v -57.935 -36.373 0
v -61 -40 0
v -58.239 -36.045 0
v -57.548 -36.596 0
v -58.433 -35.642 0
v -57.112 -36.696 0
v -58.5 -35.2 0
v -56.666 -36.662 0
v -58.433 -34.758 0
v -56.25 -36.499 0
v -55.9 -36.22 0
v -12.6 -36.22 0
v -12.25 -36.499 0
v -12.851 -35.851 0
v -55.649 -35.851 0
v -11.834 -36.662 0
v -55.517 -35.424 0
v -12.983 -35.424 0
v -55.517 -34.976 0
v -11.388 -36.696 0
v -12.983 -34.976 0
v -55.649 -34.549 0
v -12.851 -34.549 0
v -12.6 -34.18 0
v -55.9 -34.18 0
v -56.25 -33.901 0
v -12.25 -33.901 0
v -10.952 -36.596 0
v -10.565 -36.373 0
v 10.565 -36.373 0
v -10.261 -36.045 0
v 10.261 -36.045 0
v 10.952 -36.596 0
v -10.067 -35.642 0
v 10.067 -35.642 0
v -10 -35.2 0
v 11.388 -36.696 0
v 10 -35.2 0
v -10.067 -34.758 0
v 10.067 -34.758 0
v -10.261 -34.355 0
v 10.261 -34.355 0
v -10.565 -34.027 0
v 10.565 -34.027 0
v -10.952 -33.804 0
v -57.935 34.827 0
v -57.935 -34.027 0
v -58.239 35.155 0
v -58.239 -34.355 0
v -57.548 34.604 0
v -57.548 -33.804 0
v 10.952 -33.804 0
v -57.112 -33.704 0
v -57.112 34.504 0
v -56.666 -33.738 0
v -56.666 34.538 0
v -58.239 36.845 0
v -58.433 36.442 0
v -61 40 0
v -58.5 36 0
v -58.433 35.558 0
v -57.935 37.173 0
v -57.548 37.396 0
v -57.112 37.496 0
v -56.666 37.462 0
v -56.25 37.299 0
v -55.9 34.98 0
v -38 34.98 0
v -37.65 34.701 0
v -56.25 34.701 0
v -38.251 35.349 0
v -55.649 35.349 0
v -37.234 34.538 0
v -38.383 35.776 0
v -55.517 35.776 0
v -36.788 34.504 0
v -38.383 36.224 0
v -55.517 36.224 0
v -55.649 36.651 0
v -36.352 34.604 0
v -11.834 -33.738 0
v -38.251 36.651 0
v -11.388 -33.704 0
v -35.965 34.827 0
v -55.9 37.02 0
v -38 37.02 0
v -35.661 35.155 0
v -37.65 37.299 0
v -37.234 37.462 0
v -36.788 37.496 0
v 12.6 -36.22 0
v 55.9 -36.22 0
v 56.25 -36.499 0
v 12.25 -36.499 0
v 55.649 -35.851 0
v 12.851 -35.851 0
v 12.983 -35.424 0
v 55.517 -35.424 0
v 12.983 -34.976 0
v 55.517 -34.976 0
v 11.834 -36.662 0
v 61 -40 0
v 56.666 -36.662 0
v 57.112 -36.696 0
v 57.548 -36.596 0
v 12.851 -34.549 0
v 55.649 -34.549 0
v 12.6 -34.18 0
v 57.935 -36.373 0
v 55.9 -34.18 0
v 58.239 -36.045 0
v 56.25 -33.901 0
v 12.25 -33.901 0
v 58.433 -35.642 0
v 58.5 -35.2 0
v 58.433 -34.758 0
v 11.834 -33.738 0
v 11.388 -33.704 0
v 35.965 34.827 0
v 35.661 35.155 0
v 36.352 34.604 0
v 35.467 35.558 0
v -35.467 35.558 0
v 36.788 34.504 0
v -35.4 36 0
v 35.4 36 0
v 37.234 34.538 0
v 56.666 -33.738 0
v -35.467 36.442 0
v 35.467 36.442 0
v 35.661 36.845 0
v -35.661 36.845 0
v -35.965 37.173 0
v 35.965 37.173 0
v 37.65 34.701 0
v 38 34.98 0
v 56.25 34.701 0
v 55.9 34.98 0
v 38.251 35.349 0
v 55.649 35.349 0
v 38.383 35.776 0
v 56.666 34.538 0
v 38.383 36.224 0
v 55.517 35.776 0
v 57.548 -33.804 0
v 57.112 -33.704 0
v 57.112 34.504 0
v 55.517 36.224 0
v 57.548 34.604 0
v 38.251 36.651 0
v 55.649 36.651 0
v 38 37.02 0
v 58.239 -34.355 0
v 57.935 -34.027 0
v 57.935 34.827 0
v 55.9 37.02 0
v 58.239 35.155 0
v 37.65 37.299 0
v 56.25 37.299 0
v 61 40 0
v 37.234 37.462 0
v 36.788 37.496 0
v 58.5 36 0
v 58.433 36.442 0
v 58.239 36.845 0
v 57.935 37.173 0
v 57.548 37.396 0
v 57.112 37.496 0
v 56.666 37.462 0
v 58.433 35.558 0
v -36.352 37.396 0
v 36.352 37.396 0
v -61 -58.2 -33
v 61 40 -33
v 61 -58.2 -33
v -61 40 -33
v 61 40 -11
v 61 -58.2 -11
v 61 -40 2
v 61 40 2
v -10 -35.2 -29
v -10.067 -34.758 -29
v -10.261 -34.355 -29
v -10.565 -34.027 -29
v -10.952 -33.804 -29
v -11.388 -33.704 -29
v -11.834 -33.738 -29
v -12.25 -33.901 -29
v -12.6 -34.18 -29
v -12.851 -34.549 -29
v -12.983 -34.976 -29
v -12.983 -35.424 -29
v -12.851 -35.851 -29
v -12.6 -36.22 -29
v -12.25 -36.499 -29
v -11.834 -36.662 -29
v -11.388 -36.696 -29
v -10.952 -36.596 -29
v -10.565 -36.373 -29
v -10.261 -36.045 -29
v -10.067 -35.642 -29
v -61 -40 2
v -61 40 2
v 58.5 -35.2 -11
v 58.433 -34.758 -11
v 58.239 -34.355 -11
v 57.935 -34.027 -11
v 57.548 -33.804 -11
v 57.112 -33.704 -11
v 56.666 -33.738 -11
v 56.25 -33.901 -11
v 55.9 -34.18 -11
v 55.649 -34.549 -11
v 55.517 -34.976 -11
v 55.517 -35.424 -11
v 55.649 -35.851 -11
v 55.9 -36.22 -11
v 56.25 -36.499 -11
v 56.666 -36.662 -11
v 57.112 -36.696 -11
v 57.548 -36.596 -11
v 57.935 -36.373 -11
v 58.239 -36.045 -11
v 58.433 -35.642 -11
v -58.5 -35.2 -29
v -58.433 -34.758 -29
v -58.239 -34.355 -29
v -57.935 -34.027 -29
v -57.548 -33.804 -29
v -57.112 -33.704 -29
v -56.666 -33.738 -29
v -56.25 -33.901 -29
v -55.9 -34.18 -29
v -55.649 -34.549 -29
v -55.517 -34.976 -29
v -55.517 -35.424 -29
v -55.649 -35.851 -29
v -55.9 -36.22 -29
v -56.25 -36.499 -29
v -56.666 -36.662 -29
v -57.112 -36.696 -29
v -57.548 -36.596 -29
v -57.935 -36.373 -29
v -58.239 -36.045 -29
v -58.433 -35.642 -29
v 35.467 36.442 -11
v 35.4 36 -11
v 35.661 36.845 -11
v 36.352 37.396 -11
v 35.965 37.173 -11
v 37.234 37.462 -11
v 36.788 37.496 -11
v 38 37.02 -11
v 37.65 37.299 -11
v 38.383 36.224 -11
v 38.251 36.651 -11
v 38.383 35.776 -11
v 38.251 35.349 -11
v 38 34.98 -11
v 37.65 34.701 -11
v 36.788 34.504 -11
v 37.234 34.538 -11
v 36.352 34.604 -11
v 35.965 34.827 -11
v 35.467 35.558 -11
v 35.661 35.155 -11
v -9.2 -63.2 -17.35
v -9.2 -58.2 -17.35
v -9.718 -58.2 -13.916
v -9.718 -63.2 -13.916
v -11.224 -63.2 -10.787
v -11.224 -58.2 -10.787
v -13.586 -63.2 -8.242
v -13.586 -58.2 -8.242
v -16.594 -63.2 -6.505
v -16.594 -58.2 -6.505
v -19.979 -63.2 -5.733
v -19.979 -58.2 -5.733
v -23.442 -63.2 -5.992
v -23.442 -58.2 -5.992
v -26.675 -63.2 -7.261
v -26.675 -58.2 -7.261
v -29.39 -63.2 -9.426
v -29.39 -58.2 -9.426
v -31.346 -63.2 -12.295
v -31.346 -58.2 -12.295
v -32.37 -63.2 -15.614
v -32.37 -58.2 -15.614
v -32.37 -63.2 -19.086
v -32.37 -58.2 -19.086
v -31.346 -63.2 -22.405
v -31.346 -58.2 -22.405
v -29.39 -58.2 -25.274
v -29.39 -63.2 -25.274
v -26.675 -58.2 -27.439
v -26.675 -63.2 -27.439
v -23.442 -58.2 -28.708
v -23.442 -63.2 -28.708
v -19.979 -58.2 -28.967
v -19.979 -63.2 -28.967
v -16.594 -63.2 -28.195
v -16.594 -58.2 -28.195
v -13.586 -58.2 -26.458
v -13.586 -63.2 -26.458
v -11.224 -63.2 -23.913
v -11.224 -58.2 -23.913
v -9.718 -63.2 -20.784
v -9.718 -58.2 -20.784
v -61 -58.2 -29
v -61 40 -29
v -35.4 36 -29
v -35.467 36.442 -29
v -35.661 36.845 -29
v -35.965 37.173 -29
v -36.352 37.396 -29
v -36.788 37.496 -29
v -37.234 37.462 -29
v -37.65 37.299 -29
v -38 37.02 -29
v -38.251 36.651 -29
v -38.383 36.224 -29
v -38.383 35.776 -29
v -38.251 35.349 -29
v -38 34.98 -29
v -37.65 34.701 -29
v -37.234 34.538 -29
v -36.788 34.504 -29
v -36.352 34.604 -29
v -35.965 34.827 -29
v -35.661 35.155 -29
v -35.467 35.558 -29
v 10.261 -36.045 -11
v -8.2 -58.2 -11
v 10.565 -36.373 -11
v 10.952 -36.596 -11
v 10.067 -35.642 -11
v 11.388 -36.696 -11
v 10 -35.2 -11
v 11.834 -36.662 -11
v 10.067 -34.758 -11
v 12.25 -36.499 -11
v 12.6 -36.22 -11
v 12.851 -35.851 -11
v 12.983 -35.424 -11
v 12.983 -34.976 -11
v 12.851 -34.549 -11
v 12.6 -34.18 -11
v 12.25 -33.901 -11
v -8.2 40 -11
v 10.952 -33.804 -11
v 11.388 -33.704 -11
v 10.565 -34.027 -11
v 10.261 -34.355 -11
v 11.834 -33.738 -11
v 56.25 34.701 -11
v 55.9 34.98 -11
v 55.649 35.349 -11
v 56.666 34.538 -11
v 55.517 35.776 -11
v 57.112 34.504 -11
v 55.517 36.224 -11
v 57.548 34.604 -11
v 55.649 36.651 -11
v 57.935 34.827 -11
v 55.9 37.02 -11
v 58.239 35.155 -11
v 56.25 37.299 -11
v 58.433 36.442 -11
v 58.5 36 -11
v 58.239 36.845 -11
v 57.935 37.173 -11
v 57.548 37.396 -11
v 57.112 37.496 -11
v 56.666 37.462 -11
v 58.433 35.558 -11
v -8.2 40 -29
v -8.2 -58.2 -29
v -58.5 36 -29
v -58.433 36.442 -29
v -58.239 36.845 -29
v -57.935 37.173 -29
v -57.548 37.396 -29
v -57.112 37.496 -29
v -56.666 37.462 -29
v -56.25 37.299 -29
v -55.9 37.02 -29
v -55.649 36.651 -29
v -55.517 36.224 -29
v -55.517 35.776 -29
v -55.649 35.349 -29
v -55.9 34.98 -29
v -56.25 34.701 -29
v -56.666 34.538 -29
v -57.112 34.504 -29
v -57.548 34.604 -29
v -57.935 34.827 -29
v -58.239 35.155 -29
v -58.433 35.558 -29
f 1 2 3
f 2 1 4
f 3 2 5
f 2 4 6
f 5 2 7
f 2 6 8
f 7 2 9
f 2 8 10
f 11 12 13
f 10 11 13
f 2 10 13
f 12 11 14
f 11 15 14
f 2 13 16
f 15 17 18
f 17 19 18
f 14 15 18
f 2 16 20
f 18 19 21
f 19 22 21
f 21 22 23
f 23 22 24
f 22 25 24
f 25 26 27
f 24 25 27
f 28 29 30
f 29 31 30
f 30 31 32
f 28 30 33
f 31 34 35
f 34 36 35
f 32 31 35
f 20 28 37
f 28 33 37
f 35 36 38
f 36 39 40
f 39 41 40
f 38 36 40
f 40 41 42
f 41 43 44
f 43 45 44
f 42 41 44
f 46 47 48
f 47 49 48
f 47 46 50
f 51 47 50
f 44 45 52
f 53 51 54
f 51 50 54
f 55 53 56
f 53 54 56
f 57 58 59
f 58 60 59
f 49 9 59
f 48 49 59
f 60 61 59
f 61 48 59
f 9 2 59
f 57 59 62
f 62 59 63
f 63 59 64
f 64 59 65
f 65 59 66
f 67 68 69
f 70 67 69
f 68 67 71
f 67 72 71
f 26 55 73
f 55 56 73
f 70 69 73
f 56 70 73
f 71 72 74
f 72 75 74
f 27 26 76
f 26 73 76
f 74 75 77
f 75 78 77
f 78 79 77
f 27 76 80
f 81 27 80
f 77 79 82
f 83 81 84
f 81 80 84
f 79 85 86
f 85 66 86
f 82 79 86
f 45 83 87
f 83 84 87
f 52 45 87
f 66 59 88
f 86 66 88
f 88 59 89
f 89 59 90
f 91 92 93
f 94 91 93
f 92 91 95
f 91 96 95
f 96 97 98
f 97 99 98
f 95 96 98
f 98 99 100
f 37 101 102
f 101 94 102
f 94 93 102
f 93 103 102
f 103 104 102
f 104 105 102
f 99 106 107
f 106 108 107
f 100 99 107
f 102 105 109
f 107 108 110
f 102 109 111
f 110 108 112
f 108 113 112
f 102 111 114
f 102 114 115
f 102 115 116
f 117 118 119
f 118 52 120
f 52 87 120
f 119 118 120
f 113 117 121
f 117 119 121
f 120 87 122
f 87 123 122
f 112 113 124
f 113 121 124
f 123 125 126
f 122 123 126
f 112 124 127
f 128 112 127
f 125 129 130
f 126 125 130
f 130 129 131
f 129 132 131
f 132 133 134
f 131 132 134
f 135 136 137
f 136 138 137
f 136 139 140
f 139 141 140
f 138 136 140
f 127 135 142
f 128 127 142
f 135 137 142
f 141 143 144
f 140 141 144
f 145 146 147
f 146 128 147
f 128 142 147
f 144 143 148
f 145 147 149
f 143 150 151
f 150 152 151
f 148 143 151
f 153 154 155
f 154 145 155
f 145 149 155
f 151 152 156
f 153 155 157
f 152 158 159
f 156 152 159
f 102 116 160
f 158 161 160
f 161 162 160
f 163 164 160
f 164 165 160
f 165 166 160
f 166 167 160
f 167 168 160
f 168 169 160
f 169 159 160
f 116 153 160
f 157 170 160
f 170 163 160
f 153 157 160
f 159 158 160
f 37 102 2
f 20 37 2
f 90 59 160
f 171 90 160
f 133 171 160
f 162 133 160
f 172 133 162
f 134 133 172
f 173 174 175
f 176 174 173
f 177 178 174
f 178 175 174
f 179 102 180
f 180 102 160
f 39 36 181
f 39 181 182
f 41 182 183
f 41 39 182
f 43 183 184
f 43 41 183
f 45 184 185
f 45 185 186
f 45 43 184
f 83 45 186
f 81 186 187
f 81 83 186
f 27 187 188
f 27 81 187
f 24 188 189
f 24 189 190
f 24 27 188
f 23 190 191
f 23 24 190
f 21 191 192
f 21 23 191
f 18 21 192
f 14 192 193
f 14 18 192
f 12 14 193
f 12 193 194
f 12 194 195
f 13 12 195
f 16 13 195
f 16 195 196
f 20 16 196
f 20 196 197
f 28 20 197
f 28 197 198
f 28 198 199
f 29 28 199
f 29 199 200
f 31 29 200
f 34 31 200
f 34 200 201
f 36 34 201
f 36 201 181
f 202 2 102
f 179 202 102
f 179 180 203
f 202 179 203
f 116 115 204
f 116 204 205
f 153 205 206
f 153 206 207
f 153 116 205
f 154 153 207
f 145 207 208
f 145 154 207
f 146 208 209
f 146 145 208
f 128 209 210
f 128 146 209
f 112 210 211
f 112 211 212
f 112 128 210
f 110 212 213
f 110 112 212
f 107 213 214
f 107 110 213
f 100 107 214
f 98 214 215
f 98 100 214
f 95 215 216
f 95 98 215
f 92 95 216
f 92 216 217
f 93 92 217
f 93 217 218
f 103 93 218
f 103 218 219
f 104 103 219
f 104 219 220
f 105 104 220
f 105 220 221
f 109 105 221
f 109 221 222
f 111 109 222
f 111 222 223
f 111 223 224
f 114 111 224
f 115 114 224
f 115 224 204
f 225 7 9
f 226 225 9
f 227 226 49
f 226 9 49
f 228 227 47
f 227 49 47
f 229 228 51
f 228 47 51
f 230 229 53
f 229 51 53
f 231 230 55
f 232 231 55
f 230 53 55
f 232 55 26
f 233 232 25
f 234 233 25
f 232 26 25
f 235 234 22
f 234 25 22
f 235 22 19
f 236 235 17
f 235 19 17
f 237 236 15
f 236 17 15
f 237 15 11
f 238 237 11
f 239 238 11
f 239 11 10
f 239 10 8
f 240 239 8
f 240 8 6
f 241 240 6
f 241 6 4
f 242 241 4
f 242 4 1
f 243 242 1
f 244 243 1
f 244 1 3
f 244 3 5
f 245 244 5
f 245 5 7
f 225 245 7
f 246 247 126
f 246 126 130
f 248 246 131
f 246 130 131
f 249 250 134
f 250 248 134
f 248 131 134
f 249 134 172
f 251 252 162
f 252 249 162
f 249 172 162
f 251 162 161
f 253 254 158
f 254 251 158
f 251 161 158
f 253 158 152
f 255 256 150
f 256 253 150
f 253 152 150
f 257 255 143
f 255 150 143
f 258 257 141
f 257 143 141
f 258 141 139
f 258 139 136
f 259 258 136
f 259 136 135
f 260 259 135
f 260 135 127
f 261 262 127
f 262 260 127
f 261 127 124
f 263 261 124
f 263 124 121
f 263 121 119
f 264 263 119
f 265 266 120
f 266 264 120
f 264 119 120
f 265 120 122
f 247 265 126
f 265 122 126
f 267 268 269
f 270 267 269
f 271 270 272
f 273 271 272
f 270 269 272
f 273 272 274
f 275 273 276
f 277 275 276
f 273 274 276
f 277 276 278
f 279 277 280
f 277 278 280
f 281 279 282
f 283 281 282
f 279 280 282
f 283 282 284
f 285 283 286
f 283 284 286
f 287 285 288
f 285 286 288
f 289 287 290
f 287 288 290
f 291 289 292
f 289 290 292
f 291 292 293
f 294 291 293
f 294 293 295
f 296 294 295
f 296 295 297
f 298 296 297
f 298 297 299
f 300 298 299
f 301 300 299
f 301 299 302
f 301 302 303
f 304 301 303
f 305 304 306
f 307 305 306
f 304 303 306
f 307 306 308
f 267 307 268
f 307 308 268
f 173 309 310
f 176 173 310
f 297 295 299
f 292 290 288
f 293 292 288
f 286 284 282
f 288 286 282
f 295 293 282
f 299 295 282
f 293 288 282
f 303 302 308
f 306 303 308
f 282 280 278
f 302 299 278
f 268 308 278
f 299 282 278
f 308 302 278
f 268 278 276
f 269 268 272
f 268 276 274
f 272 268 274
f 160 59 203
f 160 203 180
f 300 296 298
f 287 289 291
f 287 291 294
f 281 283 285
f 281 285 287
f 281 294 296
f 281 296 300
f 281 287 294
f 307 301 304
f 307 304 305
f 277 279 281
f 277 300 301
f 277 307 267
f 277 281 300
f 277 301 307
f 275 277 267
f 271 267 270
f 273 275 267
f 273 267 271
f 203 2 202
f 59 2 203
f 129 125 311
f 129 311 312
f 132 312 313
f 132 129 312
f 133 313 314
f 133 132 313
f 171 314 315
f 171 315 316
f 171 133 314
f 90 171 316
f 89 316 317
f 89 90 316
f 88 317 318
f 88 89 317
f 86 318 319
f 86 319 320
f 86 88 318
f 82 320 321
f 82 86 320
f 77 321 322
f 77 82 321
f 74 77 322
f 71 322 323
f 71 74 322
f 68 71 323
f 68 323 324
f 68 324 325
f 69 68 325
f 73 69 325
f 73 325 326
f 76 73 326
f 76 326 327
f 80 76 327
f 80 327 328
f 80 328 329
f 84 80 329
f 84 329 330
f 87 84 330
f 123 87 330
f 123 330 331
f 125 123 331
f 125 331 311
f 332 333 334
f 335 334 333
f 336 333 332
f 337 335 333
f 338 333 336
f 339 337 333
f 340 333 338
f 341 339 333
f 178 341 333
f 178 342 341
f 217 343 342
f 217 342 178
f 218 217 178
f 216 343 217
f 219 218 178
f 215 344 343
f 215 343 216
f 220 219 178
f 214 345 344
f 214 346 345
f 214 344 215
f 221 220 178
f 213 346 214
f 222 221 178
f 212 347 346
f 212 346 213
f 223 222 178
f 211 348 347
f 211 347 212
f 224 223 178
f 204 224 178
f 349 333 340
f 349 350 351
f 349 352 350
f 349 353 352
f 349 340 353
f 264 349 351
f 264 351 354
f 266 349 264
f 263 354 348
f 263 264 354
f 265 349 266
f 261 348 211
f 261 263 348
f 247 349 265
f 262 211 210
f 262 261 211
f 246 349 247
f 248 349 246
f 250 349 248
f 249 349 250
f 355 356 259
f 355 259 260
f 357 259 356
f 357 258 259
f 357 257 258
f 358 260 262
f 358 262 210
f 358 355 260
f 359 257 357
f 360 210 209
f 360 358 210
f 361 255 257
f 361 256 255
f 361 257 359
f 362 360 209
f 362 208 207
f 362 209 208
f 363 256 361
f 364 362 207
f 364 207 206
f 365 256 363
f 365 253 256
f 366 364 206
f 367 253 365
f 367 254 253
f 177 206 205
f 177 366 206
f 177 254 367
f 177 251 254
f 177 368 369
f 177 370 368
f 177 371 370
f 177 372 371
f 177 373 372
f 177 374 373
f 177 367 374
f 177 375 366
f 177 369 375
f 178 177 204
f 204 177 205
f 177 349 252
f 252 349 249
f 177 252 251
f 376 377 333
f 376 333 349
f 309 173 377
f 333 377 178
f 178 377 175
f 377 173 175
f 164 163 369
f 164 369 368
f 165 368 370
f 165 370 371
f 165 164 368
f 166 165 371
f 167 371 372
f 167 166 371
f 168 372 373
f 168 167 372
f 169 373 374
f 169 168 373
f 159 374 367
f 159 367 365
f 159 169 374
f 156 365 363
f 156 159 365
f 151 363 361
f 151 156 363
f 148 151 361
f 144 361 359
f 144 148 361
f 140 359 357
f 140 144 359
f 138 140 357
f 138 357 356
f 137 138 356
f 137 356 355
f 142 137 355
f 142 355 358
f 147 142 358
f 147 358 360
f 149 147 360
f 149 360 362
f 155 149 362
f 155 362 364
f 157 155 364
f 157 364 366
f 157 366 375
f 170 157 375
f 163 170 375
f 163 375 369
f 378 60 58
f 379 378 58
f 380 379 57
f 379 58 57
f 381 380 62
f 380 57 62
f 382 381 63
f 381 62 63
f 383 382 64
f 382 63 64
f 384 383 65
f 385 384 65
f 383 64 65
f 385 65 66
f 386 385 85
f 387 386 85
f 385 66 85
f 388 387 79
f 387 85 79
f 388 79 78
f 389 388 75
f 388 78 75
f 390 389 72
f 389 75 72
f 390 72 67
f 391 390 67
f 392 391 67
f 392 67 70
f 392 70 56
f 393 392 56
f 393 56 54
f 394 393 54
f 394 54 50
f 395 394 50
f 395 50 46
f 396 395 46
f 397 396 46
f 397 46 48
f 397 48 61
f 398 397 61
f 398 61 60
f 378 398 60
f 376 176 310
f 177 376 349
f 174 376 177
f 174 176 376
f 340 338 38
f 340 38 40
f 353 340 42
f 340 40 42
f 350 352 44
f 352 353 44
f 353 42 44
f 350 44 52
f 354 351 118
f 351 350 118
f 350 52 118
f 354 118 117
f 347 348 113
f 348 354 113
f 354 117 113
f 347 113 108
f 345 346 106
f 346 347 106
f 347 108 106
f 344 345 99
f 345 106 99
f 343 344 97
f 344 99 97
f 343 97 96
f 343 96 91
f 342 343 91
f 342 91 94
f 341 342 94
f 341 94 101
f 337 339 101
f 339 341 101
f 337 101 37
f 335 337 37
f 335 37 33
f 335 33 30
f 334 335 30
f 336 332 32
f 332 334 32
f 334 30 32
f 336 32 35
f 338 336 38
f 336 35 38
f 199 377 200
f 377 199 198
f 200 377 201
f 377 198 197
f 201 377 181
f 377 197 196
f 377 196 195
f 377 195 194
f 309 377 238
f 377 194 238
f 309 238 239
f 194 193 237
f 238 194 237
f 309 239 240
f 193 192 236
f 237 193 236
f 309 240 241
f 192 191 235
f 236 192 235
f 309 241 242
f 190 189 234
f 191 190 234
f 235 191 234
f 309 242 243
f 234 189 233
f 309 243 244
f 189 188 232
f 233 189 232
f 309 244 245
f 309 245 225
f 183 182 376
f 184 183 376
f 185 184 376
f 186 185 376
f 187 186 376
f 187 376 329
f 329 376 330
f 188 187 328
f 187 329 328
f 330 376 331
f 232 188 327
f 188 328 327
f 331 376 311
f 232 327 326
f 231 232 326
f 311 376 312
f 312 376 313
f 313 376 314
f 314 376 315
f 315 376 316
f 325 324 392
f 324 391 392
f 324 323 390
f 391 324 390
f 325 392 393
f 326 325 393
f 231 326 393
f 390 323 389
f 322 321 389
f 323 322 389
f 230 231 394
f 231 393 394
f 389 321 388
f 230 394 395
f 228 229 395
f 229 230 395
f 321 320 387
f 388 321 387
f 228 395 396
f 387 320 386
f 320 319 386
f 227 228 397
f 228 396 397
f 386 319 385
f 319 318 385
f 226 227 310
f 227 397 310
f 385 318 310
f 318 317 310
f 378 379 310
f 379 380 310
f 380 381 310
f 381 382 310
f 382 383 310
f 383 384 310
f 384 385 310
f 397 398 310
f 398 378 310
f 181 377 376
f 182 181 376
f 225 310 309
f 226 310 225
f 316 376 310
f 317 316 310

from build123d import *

# Parameters (mm, degrees)
SKETCH_1_W      = 122
SKETCH_1_H      = 80
EXTRUDE_1_DEPTH = 2
SKETCH_2_R      = 1.5
EXTRUDE_3_DEPTH = 31
SKETCH_5_W      = 122
SKETCH_5_H      = 98.2
EXTRUDE_5_DEPTH = 4
SKETCH_6_W      = 69.2
SKETCH_6_H      = 98.2
EXTRUDE_6_DEPTH = 18
SKETCH_7_R      = 11.65
EXTRUDE_9_DEPTH = 5


with BuildPart() as part:
    # 草图1 → 凸台-拉伸1 (new body)
    with BuildSketch(Plane.XY):
        Rectangle(SKETCH_1_W, SKETCH_1_H)
    extrude(amount=EXTRUDE_1_DEPTH)

    # 草图2 → 凸台-拉伸3 (add)
    with BuildSketch(Plane.XY.offset(2)):
        with Locations((-36.9, 36)):
            Circle(SKETCH_2_R)
        with Locations((57, 36)):
            Circle(SKETCH_2_R)
        with Locations((-11.5, -35.2)):
            Circle(SKETCH_2_R)
        with Locations((57, -35.2)):
            Circle(SKETCH_2_R)
    extrude_3 = extrude(amount=-EXTRUDE_3_DEPTH)

    # 草图5 → 凸台-拉伸5 (add)
    with BuildSketch(Plane(origin=(0, 0, -29), x_dir=(-1, 0, 0), z_dir=(0, 0, -1))):
        with Locations((0, -9.1)):
            Rectangle(SKETCH_5_W, SKETCH_5_H)
    extrude(amount=EXTRUDE_5_DEPTH)

    # 镜向2: 凸台-拉伸3 across plane
    add(extrude_3.mirror(Plane(origin=(0, 0, 0), x_dir=(0, 0, 1), z_dir=(1, 0, 0))))

    # 草图6 → 凸台-拉伸6 (add)
    with BuildSketch(Plane.XY.offset(-29)):
        with Locations((26.4, -9.1)):
            Rectangle(SKETCH_6_W, SKETCH_6_H)
    extrude(amount=EXTRUDE_6_DEPTH)


with BuildPart() as body_2:
    # 草图7 → 凸台-拉伸9 (new body)
    with BuildSketch(Plane.XZ.offset(58.2)):
        with Locations((-20.85, -17.35)):
            Circle(SKETCH_7_R)
    extrude(amount=EXTRUDE_9_DEPTH)


solid = Compound([part.part, body_2.part])
